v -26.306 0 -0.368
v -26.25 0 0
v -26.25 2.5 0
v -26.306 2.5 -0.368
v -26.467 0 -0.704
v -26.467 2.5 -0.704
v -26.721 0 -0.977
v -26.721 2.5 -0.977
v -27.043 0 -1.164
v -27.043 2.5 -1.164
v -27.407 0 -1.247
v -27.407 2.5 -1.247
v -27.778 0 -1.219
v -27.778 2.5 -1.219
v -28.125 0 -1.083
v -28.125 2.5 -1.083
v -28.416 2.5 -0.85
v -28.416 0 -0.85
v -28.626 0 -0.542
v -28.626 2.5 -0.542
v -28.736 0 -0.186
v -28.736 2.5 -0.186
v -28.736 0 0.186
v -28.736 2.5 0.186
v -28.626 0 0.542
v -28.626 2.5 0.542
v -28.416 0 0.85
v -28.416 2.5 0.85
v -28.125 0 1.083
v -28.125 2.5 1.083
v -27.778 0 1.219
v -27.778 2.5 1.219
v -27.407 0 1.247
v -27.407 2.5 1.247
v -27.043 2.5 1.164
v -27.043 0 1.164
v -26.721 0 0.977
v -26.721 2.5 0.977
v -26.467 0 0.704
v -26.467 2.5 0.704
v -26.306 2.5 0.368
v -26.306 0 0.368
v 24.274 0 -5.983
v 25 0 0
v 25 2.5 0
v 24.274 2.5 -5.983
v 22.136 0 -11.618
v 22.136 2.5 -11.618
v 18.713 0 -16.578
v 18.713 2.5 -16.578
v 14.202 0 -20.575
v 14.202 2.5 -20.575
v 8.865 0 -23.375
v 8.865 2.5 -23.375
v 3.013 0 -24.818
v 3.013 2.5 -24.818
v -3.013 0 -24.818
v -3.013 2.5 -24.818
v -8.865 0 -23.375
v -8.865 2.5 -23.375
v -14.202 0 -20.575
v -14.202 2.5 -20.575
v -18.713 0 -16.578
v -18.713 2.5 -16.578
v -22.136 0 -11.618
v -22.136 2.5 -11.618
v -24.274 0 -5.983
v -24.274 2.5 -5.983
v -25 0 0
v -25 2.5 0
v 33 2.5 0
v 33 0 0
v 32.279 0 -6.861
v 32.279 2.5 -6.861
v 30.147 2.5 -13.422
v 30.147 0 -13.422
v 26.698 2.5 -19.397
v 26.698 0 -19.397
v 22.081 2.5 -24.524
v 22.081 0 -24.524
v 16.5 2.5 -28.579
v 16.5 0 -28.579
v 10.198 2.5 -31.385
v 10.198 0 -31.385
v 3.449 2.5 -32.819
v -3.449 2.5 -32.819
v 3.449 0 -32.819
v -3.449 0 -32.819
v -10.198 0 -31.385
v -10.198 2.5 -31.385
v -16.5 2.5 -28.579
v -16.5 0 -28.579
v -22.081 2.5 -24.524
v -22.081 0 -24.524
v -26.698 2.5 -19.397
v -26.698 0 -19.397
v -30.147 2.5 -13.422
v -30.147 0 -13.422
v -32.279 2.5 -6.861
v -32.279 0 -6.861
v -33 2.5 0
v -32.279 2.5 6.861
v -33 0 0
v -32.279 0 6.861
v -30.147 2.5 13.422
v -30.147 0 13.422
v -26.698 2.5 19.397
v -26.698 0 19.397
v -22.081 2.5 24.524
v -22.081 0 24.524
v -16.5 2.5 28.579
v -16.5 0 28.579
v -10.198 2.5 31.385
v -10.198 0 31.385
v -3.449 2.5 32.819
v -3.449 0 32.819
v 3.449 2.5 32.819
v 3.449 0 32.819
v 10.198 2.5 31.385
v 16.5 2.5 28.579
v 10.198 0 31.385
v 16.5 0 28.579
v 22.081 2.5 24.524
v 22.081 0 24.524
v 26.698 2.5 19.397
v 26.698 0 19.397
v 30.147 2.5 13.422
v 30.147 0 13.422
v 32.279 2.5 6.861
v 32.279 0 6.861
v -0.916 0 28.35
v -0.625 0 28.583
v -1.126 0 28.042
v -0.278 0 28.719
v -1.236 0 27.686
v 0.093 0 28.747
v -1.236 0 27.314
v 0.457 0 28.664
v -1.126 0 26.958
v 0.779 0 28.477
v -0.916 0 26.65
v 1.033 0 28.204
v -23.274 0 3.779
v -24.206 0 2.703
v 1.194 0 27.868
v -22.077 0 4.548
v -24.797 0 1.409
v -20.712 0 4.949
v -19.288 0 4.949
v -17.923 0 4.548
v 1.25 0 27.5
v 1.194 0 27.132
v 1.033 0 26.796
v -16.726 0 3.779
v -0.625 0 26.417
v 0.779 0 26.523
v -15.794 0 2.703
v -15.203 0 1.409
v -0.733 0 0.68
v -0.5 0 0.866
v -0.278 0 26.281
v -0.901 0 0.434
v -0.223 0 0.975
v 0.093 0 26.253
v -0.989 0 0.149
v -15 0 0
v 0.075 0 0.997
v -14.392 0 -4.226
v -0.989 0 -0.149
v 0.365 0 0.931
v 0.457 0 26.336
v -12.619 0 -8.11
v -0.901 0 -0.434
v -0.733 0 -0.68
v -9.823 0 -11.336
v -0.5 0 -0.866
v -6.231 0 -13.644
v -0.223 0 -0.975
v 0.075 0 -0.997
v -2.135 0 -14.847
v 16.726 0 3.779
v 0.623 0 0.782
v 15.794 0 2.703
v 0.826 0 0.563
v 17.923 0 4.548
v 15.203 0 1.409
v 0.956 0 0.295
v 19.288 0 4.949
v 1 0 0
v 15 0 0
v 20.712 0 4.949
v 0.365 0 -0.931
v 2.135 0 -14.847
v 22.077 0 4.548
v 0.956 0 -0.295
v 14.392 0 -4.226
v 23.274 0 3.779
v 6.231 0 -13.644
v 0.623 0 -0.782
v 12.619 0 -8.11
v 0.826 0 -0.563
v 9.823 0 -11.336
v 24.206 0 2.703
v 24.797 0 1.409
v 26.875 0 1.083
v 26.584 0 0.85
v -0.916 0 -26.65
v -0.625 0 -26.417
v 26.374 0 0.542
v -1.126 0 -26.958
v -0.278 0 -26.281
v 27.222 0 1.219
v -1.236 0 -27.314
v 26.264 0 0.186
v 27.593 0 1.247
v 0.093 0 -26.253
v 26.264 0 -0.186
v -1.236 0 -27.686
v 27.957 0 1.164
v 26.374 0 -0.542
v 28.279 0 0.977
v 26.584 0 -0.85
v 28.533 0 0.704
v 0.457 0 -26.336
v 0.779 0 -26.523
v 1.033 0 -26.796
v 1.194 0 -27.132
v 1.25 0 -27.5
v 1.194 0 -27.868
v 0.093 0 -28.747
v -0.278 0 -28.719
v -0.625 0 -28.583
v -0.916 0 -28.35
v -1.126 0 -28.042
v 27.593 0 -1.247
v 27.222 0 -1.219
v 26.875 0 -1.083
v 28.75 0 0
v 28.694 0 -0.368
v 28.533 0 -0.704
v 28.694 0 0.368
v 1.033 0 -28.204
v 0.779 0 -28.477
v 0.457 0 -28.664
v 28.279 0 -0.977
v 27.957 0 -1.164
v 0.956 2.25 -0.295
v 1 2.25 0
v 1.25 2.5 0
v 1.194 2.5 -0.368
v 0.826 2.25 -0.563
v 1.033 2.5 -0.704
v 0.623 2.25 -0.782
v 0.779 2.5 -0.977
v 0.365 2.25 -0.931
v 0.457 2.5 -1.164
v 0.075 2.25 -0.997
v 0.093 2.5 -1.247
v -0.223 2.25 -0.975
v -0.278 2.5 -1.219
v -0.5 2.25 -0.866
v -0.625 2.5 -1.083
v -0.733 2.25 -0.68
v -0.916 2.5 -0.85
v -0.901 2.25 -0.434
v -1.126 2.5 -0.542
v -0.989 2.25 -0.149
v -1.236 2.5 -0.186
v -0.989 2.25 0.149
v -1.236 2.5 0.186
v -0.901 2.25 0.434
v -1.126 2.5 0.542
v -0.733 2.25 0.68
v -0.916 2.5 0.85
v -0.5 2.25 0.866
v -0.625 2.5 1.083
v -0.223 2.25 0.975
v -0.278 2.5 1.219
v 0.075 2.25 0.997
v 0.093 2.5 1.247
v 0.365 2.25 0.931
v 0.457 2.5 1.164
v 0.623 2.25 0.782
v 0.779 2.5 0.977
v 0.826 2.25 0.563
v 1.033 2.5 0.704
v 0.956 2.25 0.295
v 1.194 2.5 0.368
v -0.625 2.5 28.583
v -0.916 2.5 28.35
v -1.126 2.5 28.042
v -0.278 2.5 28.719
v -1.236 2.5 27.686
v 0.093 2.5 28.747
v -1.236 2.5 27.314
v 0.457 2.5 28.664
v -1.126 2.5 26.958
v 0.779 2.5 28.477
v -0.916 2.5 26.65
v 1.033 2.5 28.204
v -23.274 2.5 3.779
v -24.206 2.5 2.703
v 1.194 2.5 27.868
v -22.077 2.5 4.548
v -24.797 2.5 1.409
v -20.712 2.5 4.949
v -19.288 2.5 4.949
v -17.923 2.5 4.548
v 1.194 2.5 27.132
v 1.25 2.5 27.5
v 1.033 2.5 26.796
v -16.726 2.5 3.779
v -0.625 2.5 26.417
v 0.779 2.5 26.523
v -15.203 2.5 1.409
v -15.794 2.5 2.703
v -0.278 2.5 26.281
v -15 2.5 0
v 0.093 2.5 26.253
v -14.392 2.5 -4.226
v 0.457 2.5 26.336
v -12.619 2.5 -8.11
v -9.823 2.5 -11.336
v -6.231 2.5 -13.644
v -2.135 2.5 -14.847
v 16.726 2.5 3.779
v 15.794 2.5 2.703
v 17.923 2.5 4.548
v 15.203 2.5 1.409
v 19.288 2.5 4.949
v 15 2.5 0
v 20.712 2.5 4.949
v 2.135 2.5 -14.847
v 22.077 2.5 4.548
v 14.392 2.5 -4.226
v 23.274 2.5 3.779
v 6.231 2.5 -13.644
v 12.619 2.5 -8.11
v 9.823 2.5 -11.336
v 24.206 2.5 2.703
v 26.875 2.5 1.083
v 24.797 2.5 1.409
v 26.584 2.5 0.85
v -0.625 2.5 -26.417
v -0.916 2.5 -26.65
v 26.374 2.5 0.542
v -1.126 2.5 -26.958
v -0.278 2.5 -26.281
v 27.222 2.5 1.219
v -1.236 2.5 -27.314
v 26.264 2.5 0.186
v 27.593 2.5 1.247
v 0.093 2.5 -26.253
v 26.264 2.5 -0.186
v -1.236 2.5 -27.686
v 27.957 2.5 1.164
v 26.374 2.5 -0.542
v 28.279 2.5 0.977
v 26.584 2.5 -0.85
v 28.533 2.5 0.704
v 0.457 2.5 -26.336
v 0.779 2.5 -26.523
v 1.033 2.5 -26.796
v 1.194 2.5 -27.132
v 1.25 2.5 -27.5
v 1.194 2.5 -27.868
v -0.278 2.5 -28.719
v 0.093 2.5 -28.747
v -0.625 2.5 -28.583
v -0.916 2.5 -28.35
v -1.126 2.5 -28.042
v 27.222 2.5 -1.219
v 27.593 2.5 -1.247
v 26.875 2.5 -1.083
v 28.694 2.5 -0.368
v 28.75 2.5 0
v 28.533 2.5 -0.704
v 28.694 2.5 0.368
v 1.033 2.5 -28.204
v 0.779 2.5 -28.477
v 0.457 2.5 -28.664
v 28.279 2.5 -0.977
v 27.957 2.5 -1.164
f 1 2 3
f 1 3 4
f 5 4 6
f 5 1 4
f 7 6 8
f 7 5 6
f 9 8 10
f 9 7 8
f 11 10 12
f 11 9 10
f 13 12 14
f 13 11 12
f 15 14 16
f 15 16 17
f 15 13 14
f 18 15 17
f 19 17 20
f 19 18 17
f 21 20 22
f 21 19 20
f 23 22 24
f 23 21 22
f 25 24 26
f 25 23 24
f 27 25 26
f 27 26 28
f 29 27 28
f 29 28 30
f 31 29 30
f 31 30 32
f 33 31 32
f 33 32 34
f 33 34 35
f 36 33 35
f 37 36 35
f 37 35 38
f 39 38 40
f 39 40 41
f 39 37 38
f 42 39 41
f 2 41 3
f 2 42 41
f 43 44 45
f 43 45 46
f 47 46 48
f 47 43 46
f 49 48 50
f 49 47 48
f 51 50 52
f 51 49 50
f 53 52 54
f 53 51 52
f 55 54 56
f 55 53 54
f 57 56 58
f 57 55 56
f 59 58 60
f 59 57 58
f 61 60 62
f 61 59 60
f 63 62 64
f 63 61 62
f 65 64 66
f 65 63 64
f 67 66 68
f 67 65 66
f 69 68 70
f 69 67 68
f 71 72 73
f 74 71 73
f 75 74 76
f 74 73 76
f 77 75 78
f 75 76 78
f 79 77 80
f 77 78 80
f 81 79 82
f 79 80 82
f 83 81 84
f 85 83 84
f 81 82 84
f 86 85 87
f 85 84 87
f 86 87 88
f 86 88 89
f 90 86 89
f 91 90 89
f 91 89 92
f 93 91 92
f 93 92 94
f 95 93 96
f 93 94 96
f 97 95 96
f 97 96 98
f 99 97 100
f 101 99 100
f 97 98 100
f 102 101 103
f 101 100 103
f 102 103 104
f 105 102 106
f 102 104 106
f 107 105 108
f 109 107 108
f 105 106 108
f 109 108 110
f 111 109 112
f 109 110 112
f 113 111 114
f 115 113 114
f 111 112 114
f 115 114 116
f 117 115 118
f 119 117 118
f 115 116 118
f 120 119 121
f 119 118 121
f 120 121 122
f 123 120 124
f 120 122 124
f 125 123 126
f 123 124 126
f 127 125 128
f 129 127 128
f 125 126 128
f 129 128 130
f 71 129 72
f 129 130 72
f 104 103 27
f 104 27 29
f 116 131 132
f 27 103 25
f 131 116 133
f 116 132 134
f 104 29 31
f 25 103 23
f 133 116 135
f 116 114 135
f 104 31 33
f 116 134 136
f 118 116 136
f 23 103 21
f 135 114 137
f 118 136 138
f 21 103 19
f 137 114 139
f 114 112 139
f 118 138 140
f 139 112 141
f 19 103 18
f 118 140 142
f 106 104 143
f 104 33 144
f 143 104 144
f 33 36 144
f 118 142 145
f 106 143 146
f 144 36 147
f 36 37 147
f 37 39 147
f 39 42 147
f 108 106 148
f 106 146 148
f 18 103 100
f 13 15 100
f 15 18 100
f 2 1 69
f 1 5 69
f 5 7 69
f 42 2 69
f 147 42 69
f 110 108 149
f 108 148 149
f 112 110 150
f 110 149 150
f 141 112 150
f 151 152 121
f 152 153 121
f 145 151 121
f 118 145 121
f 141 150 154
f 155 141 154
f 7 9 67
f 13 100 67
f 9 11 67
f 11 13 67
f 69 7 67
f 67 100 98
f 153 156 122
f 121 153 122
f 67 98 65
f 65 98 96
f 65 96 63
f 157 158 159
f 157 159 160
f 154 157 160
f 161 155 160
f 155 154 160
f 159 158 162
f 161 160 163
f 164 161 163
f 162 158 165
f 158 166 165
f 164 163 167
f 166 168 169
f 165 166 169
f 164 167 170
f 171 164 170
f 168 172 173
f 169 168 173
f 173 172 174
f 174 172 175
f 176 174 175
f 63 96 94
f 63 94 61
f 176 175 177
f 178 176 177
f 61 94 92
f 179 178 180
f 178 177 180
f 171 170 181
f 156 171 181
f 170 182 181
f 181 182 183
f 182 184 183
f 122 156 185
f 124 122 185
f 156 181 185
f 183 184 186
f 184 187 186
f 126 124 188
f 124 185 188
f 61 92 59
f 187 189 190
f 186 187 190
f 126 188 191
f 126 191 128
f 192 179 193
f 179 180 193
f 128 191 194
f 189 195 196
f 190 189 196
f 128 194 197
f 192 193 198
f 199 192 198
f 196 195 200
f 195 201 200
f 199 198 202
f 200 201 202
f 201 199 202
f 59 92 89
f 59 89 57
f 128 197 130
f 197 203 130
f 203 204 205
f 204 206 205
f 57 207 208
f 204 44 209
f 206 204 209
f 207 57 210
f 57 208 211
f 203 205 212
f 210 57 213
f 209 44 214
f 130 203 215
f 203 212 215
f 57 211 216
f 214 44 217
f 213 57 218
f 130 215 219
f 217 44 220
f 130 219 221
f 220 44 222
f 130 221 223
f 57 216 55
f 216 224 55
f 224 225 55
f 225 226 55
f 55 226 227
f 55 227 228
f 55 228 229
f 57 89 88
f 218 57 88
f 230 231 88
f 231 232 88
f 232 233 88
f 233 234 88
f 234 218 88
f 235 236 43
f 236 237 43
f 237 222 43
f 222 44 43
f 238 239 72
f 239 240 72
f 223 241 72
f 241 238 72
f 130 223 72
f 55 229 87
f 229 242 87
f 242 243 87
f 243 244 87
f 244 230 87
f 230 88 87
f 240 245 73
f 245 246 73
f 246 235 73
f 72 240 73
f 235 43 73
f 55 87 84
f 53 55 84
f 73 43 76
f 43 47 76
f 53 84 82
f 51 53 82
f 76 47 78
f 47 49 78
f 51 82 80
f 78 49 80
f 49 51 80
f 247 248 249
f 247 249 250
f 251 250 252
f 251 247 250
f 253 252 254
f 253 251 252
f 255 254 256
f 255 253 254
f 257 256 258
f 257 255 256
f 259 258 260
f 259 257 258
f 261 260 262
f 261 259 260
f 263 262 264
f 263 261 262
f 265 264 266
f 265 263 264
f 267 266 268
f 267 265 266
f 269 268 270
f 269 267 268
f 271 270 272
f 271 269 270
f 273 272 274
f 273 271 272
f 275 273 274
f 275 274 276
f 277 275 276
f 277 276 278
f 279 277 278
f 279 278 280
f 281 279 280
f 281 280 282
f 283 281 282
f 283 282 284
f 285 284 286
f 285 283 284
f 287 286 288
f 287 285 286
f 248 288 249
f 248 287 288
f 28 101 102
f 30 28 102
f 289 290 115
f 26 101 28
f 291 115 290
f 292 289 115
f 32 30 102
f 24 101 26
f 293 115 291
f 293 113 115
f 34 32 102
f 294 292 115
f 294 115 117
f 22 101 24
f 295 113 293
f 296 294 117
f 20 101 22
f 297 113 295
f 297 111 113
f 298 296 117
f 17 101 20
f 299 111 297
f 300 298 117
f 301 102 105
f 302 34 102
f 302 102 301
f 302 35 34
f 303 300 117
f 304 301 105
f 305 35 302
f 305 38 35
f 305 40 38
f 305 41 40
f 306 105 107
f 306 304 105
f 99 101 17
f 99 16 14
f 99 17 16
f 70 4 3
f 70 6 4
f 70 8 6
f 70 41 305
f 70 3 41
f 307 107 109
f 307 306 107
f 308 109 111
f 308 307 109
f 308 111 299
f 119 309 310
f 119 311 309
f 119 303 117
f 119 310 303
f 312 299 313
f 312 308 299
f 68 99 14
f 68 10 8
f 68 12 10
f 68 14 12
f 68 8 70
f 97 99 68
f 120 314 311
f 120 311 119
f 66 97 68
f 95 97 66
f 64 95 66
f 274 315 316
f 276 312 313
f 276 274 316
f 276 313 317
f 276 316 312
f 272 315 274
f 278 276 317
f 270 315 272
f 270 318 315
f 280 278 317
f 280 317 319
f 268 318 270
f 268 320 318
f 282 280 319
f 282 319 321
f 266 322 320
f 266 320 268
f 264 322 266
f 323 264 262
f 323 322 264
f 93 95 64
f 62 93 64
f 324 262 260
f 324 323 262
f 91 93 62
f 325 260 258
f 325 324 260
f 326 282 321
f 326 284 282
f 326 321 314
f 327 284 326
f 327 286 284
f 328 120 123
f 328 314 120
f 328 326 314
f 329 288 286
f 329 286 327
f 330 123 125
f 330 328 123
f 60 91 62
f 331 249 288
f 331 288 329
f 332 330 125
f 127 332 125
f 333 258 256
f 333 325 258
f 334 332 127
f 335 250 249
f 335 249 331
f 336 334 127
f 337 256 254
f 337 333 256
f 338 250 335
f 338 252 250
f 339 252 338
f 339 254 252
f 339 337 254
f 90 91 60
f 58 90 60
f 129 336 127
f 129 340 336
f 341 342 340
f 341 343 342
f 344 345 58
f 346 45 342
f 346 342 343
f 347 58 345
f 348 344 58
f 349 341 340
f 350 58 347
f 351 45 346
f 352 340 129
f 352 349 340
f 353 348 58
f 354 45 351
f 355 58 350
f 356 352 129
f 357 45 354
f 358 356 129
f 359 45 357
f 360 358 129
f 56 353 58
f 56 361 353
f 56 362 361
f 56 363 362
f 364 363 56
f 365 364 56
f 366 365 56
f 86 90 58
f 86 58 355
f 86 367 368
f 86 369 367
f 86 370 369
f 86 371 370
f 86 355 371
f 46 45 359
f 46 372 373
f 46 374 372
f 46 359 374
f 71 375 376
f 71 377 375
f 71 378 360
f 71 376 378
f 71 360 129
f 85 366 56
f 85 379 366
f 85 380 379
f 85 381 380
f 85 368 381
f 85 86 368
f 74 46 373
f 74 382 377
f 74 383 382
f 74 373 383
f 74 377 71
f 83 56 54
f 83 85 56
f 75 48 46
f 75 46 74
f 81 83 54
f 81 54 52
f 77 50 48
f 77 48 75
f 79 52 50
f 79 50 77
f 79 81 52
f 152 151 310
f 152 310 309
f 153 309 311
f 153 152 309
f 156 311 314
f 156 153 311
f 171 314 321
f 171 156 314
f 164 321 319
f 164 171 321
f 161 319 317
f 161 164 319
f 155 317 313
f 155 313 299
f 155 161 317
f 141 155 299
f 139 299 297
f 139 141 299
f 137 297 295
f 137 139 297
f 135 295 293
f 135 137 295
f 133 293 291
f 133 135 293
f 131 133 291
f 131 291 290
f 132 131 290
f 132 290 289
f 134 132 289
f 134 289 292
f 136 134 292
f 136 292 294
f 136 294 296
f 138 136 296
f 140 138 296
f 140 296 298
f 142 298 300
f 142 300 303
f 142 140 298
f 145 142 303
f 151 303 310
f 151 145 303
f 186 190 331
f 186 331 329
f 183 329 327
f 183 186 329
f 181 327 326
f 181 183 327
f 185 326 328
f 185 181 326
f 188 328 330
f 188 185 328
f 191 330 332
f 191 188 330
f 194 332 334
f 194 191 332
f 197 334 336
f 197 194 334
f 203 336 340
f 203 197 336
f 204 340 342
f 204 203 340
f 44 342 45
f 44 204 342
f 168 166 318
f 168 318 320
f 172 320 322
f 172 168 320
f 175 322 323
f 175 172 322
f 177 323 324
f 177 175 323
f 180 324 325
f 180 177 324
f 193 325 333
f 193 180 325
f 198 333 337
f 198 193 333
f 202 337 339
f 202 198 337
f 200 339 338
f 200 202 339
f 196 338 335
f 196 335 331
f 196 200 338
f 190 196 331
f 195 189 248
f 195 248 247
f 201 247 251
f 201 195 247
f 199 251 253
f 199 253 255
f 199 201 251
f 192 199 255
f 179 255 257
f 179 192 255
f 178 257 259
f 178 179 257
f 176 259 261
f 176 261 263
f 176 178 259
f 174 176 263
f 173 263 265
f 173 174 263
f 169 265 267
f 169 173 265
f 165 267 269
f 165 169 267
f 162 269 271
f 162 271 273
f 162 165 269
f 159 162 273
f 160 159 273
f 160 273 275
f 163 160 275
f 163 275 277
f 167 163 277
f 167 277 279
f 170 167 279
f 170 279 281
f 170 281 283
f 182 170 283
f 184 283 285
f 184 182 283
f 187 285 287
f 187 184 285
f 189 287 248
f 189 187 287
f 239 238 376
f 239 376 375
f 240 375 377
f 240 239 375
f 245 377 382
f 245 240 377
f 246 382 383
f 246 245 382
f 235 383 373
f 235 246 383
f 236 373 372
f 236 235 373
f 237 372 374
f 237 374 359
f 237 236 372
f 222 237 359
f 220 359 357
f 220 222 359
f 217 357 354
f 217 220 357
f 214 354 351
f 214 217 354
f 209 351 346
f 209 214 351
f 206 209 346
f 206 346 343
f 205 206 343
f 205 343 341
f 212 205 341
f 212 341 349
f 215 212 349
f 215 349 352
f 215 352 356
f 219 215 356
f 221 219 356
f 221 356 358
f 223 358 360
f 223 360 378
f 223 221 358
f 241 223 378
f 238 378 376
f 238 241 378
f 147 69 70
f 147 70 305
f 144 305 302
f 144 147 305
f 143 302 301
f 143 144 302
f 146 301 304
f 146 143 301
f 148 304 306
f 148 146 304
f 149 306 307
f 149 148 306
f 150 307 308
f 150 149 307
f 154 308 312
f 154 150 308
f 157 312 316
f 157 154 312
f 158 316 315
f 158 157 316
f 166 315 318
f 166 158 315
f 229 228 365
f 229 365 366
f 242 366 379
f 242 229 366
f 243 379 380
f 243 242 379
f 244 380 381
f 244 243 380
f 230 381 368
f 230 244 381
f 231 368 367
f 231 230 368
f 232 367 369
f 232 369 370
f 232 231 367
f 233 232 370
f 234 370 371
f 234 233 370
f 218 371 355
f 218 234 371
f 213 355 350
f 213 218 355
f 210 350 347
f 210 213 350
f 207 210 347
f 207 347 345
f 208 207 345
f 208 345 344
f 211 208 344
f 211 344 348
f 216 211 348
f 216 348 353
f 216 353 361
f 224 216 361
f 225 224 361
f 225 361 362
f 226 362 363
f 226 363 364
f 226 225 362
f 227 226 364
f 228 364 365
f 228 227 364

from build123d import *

# Parameters (mm, degrees)
SKETCH1_R               = 33
SKETCH1_R_2             = 1.25
SKETCH1_R_3             = 1
BOSS_EXTRUDE2_DEPTH     = 2.5
CUT_EXTRUDE1_DEPTH      = 3.5
CUT_EXTRUDE1_DEPTH_BACK = 10
CHAMFER5_SIZE           = 0.25


with BuildPart() as part:
    # Sketch1 → Boss-Extrude2 (new body)
    with BuildSketch(Plane(origin=(0, 0, 0), x_dir=(1, 0, 0), z_dir=(0, 1, 0))):
        Circle(SKETCH1_R)
        with Locations((0, 27.5)):
            Circle(SKETCH1_R_2, mode=Mode.SUBTRACT)
        with Locations((27.5, 0)):
            Circle(SKETCH1_R_2, mode=Mode.SUBTRACT)
        with Locations((0, -27.5)):
            Circle(SKETCH1_R_2, mode=Mode.SUBTRACT)
        with Locations((-27.5, 0)):
            Circle(SKETCH1_R_2, mode=Mode.SUBTRACT)
        Circle(SKETCH1_R_3, mode=Mode.SUBTRACT)
    extrude(amount=BOSS_EXTRUDE2_DEPTH)

    # Sketch2 → Cut-Extrude1 (cut, two sides)
    with BuildSketch(Plane(origin=(0, 0, 0), x_dir=(1, 0, 0), z_dir=(0, 1, 0))) as cut_extrude1_sk:
        with BuildLine():
            ThreePointArc((25, 0), (0, 25), (-25, 0))
            ThreePointArc((-25, 0), (-20, -5), (-15, 0))
            ThreePointArc((-15, 0), (0, 15), (15, 0))
            ThreePointArc((15, 0), (20, -5), (25, 0))
        make_face()
    extrude(amount=CUT_EXTRUDE1_DEPTH, mode=Mode.SUBTRACT)
    extrude(cut_extrude1_sk.sketch, amount=-CUT_EXTRUDE1_DEPTH_BACK, mode=Mode.SUBTRACT)

    # Chamfer5
    chamfer5_edges = [part.edges().sort_by_distance(p)[0] for p in [
        (-1, 2.5, 0),
    ]]
    chamfer(chamfer5_edges, length=CHAMFER5_SIZE)


solid = part.part
